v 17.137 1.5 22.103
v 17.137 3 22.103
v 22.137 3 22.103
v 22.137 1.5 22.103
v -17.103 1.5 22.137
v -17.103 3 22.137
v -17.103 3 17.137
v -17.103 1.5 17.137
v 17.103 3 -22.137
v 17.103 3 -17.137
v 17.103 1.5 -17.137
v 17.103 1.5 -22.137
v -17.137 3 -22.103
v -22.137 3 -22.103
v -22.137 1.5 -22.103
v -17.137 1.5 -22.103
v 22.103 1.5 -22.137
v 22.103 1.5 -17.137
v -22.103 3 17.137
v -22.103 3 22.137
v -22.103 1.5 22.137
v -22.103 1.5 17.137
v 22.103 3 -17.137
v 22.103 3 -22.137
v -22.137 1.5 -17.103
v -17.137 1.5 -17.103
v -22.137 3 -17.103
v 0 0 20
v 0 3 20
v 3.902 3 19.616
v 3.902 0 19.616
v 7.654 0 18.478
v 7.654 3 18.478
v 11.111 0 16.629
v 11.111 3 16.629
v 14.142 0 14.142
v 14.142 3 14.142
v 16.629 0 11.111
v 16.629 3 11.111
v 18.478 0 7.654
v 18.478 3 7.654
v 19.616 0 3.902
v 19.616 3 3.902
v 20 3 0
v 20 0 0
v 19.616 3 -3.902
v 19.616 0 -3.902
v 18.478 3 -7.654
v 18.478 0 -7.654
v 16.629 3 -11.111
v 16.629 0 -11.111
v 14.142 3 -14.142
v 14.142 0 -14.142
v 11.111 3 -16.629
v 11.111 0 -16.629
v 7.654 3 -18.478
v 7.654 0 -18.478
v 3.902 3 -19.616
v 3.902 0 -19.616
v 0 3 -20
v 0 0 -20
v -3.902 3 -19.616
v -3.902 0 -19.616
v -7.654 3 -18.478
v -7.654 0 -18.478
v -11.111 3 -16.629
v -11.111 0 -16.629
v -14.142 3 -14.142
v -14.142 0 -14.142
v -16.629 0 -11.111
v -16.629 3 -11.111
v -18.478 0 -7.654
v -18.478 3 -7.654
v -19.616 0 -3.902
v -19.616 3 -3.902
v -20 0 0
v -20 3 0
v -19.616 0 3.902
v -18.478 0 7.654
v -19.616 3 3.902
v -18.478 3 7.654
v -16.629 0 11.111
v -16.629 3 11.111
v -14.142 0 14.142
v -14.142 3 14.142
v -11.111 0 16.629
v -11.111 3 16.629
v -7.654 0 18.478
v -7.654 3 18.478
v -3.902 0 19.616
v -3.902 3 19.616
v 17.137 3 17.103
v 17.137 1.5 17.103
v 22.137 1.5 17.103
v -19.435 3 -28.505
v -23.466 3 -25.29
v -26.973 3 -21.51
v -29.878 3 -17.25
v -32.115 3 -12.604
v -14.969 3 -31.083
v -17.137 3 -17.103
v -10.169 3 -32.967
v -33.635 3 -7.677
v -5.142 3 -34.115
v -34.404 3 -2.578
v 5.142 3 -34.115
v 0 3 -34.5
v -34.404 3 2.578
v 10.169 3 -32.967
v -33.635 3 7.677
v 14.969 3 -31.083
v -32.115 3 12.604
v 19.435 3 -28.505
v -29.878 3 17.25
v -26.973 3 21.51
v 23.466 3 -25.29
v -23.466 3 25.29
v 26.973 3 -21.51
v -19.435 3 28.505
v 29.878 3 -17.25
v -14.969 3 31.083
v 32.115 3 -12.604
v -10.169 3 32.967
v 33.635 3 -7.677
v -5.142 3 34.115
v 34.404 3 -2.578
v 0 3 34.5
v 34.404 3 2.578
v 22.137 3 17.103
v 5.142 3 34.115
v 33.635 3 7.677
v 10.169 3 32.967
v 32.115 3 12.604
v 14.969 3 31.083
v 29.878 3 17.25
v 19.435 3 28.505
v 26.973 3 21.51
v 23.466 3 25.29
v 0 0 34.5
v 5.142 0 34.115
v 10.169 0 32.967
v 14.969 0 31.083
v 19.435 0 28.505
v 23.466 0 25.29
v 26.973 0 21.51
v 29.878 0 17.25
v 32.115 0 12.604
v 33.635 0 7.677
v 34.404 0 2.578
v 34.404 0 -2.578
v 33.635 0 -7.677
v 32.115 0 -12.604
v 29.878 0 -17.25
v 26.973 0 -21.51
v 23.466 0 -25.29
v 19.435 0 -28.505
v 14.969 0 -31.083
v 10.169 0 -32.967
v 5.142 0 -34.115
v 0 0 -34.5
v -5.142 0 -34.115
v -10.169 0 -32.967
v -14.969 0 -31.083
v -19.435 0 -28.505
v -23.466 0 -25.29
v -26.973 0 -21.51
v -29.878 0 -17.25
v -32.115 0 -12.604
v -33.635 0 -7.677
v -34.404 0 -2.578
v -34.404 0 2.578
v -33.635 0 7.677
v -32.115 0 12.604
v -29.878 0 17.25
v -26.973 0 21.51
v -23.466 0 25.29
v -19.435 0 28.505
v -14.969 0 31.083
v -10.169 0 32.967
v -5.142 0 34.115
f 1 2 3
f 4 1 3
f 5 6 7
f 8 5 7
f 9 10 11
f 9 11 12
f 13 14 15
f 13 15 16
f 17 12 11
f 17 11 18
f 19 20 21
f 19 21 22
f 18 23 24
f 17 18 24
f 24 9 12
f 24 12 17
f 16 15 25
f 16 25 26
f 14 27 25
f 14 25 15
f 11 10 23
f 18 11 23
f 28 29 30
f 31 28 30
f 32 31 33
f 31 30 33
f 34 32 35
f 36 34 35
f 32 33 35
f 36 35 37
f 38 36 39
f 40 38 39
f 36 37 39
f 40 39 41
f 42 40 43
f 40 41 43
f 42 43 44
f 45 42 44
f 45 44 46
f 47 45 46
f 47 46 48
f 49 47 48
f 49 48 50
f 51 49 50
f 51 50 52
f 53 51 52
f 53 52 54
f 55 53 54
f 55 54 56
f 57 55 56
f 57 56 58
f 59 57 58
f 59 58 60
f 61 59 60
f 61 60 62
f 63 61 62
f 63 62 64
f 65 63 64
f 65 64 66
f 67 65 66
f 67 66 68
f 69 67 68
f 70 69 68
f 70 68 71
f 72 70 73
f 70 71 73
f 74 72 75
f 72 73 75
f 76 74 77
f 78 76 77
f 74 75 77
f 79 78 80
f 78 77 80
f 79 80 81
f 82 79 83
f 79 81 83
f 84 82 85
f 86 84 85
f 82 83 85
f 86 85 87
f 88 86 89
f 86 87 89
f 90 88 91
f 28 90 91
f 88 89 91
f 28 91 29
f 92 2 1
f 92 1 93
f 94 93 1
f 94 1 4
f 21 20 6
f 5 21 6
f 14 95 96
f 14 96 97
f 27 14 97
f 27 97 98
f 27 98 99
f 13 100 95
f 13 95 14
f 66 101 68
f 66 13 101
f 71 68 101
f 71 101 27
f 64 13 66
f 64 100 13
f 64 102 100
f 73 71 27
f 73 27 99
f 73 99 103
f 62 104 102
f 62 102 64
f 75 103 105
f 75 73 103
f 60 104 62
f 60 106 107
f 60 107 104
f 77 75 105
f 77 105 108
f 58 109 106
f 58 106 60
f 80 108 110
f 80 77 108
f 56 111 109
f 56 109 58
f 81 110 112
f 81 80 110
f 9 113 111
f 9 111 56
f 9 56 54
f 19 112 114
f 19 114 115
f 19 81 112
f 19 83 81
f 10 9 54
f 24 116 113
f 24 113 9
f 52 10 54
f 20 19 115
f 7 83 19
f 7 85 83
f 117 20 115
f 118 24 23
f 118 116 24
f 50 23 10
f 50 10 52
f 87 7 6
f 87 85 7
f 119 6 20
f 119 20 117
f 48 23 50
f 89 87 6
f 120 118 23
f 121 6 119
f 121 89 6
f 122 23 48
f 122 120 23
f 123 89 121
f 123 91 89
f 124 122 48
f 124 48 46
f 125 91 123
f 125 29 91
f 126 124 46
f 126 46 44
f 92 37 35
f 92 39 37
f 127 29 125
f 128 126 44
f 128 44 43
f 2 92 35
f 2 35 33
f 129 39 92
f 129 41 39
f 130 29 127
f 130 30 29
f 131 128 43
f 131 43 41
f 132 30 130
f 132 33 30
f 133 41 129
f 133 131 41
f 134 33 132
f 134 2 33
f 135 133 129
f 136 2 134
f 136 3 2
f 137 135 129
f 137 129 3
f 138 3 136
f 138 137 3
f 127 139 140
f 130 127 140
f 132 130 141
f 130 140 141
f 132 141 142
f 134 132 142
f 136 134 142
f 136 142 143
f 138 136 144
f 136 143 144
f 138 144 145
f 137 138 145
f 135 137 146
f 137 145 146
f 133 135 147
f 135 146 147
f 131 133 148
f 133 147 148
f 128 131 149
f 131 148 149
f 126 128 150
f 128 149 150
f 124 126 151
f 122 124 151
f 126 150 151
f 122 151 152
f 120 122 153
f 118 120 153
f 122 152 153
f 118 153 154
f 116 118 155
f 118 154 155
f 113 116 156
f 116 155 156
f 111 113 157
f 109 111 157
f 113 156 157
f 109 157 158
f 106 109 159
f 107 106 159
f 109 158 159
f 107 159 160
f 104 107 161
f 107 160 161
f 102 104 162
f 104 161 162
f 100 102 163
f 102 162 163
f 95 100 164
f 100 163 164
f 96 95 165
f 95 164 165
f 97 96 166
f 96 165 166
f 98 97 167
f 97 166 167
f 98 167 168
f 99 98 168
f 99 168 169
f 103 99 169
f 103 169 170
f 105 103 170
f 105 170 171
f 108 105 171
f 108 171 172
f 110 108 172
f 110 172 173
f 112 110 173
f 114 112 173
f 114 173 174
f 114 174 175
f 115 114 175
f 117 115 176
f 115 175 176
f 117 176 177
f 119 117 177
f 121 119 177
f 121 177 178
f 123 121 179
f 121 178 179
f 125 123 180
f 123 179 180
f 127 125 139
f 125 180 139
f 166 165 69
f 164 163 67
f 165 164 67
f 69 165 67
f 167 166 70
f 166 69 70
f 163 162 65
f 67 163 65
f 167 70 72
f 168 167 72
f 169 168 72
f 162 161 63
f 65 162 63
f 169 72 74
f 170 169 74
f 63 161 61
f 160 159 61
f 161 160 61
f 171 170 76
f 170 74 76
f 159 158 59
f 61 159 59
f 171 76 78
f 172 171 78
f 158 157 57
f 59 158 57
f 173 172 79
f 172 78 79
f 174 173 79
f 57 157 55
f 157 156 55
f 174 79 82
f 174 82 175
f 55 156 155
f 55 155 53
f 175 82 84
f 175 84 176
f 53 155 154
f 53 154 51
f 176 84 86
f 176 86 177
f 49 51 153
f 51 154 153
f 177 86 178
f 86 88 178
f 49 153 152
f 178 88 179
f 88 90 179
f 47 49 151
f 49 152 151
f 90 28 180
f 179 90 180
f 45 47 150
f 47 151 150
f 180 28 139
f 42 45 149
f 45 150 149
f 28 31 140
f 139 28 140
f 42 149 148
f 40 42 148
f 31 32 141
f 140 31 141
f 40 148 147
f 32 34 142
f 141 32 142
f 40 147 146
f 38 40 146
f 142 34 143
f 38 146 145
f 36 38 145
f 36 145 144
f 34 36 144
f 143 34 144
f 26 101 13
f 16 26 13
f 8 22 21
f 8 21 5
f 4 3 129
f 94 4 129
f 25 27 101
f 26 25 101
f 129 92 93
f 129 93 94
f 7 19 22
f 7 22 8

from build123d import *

# Parameters (mm, degrees)
SKETCH1_R           = 34.5
BOSS_EXTRUDE1_DEPTH = 3
SKETCH4_R           = 20
CUT_EXTRUDE2_DEPTH  = 49.88251221
SKETCH5_W           = 5
SKETCH5_H           = 5
CUT_EXTRUDE3_DEPTH  = 1.5


with BuildPart() as part:
    # Sketch1 → Boss-Extrude1 (new body)
    with BuildSketch(Plane(origin=(0, 0, 0), x_dir=(1, 0, 0), z_dir=(0, 1, 0))):
        with Locations(Location((0, 0, 0), (0, 0, 270))):
            Circle(SKETCH1_R)
    extrude(amount=BOSS_EXTRUDE1_DEPTH)

    # Sketch4 → Cut-Extrude2 (cut, through all)
    with BuildSketch(Plane(origin=(0, 3, 0), x_dir=(1, 0, 0), z_dir=(0, 1, 0))):
        with Locations(Location((0, 0, 0), (0, 0, 270))):
            Circle(SKETCH4_R)
    extrude(amount=-CUT_EXTRUDE2_DEPTH, mode=Mode.SUBTRACT)

    # Sketch5 → Cut-Extrude3 (cut)
    with BuildSketch(Plane(origin=(0, 3, 0), x_dir=(1, 0, 0), z_dir=(0, 1, 0))):
        with Locations((19.603168608, 19.636741271)):
            Rectangle(SKETCH5_W, SKETCH5_H)
        with Locations((-19.636741271, 19.603168608)):
            Rectangle(SKETCH5_W, SKETCH5_H)
        with Locations((19.636741271, -19.603168608)):
            Rectangle(SKETCH5_W, SKETCH5_H)
        with Locations((-19.603168608, -19.636741271)):
            Rectangle(SKETCH5_W, SKETCH5_H)
    extrude(amount=-CUT_EXTRUDE3_DEPTH, mode=Mode.SUBTRACT)


solid = part.part
